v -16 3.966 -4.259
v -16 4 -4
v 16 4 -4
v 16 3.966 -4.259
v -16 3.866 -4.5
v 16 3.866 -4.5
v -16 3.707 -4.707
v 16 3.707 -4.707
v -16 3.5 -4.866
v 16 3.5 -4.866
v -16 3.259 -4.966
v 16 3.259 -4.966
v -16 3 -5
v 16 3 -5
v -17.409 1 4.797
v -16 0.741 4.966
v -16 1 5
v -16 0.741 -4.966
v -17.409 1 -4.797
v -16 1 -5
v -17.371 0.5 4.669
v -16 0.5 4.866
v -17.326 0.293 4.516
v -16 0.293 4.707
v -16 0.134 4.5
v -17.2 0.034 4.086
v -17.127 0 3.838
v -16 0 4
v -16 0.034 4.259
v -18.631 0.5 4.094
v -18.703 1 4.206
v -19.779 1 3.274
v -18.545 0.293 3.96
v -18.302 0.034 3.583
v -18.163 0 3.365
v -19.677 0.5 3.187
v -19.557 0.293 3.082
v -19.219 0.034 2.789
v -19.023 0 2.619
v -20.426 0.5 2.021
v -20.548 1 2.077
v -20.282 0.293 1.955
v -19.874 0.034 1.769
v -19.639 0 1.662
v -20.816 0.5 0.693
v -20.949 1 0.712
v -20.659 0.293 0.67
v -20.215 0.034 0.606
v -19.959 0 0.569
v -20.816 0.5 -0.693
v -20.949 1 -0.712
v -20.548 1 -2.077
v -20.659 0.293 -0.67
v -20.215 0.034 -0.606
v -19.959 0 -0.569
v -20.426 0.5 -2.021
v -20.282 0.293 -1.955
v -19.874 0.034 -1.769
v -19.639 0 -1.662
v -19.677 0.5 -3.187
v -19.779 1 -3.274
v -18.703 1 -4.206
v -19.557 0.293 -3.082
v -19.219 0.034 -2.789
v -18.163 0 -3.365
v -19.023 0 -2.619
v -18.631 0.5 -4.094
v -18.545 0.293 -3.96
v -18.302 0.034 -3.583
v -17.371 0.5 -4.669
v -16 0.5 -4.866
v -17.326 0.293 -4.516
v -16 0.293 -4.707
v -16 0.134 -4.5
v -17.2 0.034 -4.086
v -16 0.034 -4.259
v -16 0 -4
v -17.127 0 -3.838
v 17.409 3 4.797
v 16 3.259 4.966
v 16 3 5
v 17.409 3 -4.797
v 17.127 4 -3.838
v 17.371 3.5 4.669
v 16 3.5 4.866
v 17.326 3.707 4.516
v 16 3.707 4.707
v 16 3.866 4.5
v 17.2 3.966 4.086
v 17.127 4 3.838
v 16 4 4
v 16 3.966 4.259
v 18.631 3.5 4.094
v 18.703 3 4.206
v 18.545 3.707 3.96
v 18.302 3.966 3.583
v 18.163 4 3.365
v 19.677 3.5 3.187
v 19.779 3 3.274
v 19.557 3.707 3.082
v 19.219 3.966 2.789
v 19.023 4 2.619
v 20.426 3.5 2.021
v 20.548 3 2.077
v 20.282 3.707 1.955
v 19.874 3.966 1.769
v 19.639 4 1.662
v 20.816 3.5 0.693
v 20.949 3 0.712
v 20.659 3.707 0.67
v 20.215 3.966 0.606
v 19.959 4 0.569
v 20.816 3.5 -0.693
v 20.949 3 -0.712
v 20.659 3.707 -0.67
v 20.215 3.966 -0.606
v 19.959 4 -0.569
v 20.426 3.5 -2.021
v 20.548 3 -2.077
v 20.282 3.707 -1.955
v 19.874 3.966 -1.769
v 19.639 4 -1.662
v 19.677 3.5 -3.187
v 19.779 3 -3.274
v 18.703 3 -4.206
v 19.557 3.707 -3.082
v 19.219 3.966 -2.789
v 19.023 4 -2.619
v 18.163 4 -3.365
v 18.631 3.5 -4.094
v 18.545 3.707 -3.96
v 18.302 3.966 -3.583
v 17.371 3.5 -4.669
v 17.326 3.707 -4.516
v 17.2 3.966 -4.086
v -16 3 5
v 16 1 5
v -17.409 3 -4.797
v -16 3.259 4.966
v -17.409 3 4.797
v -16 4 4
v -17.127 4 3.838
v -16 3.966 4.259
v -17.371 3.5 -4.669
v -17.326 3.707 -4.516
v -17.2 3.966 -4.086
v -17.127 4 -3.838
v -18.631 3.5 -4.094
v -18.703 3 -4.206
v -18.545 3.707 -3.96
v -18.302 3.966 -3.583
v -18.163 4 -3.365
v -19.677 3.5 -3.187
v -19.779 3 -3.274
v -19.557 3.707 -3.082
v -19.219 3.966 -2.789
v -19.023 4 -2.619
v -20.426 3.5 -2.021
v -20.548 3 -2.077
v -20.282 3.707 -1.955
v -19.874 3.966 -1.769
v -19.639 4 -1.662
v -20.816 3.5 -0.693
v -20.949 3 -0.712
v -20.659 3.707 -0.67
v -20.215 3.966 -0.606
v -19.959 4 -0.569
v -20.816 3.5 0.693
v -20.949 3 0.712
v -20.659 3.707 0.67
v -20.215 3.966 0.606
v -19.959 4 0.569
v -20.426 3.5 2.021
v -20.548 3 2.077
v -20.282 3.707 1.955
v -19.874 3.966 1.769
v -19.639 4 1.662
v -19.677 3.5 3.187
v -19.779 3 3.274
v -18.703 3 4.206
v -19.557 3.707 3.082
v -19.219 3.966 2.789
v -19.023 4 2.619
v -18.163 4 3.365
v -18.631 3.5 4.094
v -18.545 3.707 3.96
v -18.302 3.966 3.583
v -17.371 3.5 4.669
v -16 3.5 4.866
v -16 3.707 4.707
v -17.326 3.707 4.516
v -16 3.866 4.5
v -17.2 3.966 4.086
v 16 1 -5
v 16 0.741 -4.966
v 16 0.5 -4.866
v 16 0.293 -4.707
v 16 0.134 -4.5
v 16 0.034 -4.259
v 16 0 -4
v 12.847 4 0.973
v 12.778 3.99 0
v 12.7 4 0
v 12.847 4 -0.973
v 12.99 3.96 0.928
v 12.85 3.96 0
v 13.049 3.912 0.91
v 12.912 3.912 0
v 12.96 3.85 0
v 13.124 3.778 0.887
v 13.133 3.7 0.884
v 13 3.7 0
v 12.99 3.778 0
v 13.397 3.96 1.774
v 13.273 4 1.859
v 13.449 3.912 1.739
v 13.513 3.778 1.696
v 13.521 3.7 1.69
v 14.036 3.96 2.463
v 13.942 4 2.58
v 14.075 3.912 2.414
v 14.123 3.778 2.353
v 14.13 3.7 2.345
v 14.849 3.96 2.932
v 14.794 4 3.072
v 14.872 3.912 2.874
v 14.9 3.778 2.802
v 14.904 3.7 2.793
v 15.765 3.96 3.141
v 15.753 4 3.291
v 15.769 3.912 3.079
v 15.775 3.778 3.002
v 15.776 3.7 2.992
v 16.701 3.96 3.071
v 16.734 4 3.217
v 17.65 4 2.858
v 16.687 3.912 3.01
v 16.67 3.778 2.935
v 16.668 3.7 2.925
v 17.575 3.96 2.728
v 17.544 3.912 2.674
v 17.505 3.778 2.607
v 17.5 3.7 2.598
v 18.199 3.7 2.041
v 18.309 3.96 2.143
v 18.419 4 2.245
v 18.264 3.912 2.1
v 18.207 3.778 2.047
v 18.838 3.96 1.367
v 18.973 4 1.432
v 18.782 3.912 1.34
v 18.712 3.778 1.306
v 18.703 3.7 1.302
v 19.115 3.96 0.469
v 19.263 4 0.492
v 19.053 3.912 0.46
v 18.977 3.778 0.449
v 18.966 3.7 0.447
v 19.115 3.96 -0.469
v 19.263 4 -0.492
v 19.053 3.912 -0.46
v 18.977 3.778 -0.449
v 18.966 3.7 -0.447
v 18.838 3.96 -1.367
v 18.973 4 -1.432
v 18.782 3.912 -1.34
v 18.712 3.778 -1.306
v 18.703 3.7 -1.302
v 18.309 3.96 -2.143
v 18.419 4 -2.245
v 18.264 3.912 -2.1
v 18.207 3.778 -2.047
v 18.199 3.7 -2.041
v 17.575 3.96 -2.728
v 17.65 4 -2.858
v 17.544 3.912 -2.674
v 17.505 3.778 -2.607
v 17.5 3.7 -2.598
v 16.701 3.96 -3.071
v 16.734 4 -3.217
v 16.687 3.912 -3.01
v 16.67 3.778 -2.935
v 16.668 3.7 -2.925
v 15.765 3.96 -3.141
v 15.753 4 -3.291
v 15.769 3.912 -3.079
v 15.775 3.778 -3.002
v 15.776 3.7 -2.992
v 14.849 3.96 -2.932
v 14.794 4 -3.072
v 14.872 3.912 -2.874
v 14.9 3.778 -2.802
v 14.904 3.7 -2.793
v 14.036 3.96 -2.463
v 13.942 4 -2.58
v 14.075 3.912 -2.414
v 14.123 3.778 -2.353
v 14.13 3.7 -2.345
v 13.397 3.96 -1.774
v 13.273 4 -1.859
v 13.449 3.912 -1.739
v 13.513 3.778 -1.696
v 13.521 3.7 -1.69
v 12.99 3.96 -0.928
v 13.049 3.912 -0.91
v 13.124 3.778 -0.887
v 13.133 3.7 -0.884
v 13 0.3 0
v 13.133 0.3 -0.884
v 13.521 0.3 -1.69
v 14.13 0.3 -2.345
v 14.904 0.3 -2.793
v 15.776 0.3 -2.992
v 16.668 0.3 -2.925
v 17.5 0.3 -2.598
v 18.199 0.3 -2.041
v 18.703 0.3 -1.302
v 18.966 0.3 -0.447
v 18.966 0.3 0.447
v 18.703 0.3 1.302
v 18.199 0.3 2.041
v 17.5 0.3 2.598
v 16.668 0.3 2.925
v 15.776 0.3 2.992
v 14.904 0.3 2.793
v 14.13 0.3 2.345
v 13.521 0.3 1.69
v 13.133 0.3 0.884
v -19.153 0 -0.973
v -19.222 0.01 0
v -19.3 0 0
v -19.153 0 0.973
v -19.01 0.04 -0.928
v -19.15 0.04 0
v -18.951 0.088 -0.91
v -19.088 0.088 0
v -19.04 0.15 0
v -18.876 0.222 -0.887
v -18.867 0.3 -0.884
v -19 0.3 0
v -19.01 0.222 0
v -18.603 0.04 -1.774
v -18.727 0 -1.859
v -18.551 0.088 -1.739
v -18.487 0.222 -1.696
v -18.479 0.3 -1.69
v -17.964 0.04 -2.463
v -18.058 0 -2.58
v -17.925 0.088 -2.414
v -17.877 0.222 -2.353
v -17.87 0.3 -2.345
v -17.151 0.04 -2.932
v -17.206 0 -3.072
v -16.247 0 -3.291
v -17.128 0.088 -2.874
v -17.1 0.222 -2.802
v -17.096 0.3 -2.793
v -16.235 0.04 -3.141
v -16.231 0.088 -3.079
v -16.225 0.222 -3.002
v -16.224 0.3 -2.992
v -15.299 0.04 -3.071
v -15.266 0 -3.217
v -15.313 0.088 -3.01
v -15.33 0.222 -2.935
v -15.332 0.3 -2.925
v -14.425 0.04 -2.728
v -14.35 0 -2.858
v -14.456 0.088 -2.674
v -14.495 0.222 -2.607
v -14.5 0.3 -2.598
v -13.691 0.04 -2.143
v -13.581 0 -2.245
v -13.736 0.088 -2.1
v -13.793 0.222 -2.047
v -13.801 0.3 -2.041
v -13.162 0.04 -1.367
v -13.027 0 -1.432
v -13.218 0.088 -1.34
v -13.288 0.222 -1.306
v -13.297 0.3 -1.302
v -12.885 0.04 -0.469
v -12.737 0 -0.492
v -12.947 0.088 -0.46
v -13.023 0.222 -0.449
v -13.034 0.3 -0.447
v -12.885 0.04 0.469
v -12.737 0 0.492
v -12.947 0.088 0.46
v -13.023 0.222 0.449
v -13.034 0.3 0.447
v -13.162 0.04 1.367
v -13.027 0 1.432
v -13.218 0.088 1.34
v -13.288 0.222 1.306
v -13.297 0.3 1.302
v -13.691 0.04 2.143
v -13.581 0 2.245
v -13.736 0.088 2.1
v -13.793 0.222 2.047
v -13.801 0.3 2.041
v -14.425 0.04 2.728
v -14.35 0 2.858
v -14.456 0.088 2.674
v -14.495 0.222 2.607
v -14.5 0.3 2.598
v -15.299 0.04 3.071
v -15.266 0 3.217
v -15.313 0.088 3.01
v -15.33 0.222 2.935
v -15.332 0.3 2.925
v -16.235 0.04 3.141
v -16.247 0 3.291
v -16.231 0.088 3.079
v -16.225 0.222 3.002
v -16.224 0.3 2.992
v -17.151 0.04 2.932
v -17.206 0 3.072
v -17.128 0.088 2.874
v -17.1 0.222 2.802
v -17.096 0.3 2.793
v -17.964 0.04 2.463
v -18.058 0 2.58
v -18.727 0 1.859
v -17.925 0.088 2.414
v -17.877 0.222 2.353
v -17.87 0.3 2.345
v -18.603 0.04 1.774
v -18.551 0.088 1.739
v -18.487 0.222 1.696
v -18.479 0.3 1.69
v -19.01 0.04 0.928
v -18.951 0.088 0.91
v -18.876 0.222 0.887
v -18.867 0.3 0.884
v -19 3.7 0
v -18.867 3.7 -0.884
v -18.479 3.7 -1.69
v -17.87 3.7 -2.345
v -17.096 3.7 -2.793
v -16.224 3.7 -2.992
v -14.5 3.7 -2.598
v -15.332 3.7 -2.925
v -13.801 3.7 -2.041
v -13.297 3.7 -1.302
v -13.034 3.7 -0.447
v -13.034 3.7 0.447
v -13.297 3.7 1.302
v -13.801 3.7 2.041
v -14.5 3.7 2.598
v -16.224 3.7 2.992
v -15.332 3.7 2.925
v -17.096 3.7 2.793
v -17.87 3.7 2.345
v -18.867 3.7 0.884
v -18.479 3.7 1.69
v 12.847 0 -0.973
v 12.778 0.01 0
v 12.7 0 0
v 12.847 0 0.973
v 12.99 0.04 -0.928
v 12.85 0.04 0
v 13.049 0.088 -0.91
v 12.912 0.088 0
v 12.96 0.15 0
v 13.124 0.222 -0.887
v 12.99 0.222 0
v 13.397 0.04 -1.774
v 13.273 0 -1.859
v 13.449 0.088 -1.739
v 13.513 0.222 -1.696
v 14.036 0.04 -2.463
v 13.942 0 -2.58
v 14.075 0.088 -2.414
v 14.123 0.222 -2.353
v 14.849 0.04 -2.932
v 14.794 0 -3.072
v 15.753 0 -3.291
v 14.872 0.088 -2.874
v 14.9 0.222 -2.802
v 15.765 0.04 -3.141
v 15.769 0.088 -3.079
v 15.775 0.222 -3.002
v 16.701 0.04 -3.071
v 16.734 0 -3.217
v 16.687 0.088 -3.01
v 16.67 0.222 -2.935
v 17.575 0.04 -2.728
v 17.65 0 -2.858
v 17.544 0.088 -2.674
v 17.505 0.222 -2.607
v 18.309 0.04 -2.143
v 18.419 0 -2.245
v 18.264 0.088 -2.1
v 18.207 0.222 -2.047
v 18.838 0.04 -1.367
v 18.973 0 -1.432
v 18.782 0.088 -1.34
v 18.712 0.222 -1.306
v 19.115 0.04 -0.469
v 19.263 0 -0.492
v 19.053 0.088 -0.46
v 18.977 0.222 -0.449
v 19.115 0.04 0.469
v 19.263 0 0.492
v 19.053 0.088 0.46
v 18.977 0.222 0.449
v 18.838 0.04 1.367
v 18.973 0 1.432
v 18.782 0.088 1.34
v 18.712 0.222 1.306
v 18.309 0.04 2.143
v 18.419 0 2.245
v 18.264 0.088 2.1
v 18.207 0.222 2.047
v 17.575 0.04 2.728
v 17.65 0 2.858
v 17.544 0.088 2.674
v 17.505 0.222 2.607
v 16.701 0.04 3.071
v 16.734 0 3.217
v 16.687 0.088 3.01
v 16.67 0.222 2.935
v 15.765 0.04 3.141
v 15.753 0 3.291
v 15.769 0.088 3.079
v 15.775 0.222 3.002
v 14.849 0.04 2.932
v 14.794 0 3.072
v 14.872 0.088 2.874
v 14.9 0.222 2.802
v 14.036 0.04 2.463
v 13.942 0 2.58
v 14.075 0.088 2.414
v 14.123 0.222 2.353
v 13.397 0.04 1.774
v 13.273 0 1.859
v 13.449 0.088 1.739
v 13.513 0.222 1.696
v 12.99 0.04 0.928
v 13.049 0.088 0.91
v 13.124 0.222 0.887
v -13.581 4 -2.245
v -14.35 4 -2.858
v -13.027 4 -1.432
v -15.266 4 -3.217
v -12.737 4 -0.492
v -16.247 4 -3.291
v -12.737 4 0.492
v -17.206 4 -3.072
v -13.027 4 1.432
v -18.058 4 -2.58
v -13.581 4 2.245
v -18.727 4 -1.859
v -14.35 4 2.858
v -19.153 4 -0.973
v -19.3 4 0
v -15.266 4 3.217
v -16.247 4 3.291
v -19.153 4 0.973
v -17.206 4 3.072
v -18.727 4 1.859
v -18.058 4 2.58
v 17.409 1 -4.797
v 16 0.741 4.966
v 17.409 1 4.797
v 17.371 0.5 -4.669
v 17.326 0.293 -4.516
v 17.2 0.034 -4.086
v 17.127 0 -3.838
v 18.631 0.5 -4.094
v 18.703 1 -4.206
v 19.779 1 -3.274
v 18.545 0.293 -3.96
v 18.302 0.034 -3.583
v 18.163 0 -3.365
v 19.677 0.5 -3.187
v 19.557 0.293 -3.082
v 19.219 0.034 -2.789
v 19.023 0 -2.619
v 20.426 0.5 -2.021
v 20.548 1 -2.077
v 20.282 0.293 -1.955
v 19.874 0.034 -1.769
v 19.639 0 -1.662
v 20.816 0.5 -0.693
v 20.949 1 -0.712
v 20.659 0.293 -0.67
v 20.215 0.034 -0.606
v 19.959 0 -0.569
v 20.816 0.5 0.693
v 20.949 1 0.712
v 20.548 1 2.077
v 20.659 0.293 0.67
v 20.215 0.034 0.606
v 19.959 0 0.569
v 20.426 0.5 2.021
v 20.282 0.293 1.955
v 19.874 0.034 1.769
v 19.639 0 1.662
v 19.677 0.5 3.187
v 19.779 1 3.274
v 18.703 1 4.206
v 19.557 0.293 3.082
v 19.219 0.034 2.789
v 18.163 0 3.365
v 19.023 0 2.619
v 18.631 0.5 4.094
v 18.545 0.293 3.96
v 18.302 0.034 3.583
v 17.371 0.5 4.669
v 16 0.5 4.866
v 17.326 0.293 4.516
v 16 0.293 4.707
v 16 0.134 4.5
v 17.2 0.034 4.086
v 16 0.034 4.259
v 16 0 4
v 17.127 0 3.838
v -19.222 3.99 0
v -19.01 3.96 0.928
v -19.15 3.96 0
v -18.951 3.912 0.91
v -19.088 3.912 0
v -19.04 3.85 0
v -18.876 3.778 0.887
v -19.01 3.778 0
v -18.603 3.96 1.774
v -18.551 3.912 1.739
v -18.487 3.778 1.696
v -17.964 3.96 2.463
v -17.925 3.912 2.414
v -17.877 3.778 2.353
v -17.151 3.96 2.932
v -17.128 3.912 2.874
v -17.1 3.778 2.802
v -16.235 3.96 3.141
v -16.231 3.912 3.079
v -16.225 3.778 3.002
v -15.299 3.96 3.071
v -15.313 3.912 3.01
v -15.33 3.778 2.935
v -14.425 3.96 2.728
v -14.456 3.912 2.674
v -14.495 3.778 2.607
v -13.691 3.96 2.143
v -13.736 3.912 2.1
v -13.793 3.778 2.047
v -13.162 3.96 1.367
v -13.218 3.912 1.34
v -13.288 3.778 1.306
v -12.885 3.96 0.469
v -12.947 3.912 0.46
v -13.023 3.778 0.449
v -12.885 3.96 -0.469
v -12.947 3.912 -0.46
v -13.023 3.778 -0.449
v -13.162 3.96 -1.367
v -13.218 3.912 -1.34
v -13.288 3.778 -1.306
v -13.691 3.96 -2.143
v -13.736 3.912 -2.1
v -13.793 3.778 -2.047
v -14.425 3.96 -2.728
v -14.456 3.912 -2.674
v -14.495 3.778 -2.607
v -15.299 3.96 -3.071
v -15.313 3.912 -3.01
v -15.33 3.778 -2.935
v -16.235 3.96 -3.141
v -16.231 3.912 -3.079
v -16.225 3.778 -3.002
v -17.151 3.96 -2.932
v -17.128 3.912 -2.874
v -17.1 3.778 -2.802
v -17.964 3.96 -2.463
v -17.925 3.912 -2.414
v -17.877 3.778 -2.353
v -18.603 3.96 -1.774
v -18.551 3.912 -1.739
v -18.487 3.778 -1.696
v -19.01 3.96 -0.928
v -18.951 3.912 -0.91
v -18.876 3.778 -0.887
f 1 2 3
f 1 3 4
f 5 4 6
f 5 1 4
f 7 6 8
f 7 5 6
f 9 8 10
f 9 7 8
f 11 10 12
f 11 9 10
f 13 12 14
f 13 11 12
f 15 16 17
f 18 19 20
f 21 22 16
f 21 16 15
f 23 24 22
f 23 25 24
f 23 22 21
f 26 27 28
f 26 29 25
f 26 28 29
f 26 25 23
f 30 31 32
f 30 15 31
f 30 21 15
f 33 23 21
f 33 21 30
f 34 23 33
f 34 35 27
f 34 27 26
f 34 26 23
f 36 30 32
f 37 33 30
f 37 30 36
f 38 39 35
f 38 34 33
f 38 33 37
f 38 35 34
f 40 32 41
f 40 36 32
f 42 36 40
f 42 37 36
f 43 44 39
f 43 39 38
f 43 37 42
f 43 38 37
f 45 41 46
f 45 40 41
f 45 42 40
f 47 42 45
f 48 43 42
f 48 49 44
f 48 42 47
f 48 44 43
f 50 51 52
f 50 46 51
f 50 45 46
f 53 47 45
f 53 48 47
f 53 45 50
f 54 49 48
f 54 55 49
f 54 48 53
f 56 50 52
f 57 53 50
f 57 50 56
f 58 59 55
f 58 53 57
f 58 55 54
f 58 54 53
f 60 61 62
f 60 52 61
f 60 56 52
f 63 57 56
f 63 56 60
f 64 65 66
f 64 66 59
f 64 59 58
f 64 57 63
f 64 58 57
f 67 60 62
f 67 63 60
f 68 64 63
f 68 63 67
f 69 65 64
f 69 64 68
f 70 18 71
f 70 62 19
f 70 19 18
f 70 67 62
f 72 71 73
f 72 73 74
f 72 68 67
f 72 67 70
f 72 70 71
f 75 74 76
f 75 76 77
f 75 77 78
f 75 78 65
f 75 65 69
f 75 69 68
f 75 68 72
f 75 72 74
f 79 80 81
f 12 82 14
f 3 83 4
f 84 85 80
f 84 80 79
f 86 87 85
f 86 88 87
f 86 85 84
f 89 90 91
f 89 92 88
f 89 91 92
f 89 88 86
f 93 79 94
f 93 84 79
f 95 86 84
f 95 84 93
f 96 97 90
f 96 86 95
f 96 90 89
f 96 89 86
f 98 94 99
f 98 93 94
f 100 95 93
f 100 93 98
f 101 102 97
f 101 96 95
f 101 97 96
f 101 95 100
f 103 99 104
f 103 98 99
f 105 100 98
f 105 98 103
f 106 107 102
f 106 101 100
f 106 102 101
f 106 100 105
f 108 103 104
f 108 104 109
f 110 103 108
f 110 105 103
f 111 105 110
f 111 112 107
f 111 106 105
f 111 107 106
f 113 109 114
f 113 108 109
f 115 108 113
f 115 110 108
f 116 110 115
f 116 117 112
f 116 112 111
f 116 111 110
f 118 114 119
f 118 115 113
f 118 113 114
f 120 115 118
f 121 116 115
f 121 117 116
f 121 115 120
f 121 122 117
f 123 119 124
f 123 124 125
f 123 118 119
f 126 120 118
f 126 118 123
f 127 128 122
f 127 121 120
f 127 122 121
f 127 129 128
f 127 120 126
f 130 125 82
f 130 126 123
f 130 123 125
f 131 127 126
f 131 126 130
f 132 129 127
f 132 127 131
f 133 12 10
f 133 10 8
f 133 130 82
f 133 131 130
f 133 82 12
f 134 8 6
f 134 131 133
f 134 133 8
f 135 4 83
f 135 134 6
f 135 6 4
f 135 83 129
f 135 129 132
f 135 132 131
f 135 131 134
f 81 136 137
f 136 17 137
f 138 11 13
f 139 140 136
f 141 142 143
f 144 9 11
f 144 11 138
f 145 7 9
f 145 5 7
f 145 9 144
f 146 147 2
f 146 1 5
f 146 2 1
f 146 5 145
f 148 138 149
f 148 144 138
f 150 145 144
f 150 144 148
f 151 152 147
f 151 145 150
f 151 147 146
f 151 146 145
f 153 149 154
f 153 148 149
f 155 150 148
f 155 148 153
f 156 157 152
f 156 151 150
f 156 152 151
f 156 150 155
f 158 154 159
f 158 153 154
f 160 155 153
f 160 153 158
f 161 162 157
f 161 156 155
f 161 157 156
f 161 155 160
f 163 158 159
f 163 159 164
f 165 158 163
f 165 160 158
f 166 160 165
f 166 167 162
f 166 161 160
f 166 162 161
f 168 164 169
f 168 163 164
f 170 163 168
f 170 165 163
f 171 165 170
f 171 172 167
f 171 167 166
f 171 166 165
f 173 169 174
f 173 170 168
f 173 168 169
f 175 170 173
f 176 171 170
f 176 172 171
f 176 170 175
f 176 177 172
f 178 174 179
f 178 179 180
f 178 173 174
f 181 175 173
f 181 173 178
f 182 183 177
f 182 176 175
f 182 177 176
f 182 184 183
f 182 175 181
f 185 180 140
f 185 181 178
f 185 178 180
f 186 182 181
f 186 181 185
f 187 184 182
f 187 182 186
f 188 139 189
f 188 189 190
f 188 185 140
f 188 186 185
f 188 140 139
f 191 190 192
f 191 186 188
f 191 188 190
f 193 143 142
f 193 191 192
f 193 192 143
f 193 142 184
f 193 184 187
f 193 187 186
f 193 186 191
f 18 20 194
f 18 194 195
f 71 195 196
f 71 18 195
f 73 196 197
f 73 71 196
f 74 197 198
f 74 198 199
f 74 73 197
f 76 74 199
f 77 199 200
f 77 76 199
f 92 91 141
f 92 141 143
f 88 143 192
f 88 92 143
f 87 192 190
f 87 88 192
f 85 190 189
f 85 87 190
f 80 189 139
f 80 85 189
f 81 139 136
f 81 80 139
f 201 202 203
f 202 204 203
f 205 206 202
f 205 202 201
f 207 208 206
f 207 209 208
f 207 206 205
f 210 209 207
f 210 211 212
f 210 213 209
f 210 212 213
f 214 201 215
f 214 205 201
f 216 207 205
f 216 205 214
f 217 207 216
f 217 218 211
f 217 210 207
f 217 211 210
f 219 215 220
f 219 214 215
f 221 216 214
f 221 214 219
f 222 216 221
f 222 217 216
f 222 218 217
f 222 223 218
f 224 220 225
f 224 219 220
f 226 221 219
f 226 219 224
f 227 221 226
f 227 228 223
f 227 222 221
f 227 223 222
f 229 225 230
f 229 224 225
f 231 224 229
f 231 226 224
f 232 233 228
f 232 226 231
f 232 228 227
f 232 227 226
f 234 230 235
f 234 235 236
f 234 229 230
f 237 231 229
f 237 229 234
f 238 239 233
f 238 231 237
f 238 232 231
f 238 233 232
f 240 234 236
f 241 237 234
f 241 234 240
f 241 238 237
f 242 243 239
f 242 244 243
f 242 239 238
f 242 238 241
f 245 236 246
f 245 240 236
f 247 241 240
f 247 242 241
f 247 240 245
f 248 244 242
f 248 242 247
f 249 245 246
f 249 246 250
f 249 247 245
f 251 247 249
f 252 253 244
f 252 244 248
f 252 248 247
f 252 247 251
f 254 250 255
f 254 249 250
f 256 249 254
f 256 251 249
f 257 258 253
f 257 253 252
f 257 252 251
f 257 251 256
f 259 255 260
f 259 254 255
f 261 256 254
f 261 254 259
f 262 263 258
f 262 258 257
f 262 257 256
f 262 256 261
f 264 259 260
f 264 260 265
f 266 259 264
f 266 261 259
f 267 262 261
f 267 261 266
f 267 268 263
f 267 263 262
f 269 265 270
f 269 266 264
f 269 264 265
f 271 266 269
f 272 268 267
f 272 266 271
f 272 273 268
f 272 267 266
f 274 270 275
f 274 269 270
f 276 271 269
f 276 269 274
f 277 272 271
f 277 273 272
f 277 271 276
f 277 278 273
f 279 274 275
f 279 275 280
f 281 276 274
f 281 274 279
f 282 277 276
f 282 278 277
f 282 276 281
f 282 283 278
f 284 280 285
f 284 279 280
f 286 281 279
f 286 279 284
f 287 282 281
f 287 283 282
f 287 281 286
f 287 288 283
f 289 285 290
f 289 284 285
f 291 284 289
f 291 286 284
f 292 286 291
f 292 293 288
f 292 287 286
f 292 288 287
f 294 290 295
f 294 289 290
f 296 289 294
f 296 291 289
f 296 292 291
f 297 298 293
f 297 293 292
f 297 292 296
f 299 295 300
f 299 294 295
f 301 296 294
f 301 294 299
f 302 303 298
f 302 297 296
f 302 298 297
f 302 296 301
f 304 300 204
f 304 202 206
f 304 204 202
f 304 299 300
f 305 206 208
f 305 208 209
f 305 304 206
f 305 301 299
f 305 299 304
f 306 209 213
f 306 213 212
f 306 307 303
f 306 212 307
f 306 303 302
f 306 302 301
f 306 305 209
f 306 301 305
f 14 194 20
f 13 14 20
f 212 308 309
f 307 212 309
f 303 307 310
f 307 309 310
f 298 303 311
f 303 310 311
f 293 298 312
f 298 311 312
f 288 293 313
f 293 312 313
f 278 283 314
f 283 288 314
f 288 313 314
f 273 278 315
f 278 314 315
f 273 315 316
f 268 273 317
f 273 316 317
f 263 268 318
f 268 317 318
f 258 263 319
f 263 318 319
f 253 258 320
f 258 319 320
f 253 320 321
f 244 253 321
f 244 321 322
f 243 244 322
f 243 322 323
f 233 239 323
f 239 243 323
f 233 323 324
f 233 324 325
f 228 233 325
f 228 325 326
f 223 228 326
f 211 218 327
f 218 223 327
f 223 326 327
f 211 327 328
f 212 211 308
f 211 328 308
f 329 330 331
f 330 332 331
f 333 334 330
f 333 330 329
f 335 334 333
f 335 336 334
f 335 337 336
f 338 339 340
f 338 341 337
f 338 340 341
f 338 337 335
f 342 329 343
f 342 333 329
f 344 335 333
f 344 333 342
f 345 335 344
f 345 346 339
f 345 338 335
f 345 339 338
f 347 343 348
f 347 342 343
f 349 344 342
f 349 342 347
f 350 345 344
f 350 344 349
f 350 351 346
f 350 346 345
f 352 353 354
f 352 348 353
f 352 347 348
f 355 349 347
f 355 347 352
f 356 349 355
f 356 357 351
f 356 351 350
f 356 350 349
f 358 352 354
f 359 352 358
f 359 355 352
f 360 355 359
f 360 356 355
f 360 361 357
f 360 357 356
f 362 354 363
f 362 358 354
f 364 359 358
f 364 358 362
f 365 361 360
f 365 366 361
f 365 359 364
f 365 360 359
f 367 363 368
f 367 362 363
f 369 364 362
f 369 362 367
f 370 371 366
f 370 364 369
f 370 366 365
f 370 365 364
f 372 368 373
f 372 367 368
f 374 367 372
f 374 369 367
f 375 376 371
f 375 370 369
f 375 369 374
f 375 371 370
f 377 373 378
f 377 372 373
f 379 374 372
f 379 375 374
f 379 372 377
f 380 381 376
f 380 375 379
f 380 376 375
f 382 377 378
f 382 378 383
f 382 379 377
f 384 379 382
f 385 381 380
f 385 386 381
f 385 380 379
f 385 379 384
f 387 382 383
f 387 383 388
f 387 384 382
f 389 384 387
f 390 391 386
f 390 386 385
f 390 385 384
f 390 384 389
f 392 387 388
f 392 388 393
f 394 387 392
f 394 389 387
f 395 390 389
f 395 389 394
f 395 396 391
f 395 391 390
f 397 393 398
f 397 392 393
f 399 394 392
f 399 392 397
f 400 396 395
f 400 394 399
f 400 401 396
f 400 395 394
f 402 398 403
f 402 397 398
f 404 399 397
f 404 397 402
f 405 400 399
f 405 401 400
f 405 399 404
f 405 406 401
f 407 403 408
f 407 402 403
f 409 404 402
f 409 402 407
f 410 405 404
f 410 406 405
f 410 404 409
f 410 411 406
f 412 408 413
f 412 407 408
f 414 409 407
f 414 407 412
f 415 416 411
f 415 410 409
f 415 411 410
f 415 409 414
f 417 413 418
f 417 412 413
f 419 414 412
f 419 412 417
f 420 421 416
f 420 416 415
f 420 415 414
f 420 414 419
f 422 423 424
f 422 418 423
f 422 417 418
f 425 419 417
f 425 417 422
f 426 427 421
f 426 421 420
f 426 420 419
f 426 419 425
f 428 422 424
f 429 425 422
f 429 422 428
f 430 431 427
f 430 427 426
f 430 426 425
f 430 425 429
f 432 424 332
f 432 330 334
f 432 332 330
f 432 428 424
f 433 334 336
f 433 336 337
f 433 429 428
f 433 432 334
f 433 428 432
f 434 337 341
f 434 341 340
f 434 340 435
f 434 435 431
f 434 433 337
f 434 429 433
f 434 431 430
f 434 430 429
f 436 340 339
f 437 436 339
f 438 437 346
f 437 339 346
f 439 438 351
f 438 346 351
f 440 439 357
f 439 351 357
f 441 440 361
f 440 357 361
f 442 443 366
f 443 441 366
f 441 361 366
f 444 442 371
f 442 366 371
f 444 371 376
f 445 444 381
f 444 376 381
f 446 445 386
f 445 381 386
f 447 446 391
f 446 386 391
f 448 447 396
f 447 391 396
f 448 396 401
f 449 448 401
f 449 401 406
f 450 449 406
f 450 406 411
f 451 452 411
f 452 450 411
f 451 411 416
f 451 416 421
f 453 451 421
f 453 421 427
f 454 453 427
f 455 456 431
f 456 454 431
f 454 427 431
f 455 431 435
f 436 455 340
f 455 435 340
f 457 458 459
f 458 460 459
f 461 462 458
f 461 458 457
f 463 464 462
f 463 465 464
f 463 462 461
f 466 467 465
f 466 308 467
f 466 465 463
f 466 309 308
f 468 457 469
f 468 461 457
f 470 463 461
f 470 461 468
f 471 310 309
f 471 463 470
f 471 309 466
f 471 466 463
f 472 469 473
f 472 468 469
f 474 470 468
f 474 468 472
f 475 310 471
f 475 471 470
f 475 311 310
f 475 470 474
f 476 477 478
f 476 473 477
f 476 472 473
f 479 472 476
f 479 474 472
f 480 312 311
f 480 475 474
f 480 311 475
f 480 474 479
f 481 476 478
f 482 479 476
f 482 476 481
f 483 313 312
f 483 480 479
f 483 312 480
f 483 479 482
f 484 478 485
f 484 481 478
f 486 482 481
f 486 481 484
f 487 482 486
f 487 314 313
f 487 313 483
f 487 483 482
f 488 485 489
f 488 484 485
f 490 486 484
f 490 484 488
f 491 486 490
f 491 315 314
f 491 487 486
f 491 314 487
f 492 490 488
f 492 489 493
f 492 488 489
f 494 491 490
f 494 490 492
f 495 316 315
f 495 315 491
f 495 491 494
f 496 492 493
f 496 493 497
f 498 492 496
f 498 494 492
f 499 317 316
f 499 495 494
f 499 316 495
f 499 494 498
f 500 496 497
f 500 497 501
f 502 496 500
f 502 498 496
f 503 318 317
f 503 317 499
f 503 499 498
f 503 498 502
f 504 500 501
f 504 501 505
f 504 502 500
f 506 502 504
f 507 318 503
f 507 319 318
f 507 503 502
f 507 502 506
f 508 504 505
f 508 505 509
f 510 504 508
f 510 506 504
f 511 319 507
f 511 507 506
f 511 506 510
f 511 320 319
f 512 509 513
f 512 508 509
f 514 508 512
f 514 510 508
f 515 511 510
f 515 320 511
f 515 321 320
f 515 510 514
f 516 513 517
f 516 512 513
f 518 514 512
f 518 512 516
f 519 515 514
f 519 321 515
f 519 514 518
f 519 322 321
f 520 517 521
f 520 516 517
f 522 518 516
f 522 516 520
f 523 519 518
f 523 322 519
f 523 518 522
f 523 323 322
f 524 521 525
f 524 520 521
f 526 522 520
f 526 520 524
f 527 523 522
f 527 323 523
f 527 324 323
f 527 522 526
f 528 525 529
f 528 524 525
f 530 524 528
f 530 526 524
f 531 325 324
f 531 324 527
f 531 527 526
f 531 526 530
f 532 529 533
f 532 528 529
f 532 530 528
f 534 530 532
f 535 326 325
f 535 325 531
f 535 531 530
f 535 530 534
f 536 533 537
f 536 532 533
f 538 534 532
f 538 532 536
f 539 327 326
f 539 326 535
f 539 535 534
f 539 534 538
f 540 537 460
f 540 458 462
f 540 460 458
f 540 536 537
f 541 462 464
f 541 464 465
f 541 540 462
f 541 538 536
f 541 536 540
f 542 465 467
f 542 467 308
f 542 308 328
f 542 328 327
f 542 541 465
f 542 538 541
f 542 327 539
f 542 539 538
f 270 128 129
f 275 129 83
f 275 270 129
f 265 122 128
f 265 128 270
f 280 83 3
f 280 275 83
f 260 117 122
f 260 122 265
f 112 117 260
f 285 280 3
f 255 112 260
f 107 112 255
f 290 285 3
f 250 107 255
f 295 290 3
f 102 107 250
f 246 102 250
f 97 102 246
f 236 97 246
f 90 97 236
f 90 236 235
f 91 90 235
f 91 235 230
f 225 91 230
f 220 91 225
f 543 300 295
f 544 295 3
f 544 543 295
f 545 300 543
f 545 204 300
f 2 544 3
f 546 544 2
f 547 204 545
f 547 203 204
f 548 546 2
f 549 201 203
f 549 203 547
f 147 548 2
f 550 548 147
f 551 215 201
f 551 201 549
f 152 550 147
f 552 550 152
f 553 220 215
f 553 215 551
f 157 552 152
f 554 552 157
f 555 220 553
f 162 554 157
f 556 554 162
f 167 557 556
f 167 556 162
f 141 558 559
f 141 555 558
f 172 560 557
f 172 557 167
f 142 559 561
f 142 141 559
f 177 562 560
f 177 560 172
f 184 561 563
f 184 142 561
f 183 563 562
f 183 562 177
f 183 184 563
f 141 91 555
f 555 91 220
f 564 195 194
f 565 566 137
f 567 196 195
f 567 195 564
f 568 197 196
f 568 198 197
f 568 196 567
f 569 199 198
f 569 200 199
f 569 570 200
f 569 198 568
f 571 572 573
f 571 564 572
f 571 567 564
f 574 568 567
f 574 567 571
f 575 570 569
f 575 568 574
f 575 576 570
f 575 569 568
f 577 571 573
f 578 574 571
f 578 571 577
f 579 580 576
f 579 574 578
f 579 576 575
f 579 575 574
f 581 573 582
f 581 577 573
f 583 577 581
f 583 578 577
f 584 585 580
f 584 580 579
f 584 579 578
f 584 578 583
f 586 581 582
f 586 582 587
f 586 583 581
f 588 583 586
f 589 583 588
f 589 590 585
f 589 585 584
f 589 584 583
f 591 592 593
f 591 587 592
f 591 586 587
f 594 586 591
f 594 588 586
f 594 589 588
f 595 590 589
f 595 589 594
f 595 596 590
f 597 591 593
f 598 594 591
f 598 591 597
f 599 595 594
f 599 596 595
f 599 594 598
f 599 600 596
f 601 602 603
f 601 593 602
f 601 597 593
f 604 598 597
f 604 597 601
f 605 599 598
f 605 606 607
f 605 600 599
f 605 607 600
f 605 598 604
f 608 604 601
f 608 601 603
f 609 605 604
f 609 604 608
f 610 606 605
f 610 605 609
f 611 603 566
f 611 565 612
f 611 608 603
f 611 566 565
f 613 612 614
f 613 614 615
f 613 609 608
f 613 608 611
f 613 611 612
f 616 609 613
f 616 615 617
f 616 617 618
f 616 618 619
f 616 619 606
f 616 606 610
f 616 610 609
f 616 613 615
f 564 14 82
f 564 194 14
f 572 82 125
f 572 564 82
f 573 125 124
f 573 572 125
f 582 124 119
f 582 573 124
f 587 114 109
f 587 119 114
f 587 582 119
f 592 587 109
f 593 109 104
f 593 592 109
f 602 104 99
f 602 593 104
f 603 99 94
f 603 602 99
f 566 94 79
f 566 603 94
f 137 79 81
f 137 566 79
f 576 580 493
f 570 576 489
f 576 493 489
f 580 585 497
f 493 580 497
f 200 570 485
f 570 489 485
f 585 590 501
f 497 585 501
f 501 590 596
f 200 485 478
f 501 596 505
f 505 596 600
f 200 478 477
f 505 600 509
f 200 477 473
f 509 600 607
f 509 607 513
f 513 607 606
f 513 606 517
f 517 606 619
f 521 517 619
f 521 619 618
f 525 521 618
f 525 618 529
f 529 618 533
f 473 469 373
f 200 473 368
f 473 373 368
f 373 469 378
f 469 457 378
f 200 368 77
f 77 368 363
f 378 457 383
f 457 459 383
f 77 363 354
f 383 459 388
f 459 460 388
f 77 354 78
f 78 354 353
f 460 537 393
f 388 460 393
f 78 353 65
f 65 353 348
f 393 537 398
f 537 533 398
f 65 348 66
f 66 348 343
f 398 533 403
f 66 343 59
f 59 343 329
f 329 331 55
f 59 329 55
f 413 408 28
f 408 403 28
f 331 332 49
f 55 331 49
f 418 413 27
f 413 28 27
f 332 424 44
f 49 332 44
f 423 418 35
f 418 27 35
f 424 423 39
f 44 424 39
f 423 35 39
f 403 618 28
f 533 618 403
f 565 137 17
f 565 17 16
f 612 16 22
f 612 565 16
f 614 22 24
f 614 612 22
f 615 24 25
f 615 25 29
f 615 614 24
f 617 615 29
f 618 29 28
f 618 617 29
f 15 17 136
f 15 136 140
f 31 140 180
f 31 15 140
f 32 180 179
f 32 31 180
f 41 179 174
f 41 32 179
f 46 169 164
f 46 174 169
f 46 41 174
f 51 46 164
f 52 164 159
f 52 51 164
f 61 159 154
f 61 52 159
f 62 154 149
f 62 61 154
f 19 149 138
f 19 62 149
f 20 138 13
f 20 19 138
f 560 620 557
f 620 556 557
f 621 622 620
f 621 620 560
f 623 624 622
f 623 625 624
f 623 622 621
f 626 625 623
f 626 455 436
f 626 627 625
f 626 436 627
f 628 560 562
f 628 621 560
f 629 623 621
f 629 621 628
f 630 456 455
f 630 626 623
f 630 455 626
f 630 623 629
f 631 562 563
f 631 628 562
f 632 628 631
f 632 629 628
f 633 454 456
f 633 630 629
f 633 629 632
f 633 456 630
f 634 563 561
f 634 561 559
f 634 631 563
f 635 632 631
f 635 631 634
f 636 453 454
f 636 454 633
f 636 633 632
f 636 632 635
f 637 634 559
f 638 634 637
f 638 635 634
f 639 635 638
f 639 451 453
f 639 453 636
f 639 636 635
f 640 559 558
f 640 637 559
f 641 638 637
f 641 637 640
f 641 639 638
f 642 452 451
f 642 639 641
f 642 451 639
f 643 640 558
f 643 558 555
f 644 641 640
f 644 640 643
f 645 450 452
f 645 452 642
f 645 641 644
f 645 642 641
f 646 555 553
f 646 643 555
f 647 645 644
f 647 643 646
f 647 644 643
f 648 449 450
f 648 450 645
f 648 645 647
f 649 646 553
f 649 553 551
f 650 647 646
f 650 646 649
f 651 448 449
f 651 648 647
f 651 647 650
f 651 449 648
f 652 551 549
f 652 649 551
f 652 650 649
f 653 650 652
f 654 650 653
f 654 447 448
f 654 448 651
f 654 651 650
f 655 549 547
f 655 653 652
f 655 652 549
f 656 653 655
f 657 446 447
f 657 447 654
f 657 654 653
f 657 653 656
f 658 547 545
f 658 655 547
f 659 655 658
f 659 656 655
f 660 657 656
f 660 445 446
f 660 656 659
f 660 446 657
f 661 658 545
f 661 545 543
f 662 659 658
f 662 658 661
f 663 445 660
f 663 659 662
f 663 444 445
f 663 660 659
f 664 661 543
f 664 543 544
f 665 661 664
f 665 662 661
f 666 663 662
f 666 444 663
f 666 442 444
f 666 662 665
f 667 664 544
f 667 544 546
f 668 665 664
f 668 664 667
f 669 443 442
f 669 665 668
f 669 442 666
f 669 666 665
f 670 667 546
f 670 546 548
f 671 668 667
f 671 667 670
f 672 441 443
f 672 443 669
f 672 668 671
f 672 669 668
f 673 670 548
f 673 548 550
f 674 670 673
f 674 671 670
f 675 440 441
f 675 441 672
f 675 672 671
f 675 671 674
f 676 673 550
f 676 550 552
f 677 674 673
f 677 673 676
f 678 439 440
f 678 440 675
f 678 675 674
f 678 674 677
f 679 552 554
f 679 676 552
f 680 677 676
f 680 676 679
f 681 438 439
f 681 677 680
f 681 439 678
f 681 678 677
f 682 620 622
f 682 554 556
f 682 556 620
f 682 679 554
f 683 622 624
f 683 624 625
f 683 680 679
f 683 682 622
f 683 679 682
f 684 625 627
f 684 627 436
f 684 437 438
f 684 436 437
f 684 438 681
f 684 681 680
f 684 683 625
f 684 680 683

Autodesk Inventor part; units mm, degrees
ref_plane "YZ Plane" through (0, 0, 0) normal (1, 0, 0) x (0, 1, 0)
ref_plane "XY Plane" through (0, 0, 0) normal (0, 0, 1) x (1, 0, 0)
sketch "Эскиз1" plane through (0, 0, 0) normal (0, 1, 0) x (-1, 0, 0)
  line L0 (16, 0) -> (-16, 0) construction
  line L1 (16, 5) -> (-16, 5)
  line L2 (-16, -5) -> (16, -5)
  arc A0 (16, -5) -> (16, 5) centre (16, 0) ccw
  arc A1 (-16, 5) -> (-16, -5) centre (-16, 0) ccw
  circle A2 centre (16, 0) radius 3
  circle A3 centre (-16, 0) radius 3
  point P0 (0, 0)
  point P1 (0, 0)
  dimension "d0" = 32
  dimension "d1" = 10
  dimension "d2" = 6
extrude "Выдавливание1" add sketch "Эскиз1" along normal blind 4
fillet "Сопряжение1" radius 1 8 edges at (21, 4, 0) (0, 4, -5) (-21, 4, 0) (0, 4, 5) (21, 0, 0) (0, 0, -5) (-21, 0, 0) (0, 0, 5)
fillet "Сопряжение2" radius 0.3 4 edges at (-13, 0, 0) (-13, 4, 0) (19, 0, 0) (19, 4, 0)
properties part number "рычаг-1"
